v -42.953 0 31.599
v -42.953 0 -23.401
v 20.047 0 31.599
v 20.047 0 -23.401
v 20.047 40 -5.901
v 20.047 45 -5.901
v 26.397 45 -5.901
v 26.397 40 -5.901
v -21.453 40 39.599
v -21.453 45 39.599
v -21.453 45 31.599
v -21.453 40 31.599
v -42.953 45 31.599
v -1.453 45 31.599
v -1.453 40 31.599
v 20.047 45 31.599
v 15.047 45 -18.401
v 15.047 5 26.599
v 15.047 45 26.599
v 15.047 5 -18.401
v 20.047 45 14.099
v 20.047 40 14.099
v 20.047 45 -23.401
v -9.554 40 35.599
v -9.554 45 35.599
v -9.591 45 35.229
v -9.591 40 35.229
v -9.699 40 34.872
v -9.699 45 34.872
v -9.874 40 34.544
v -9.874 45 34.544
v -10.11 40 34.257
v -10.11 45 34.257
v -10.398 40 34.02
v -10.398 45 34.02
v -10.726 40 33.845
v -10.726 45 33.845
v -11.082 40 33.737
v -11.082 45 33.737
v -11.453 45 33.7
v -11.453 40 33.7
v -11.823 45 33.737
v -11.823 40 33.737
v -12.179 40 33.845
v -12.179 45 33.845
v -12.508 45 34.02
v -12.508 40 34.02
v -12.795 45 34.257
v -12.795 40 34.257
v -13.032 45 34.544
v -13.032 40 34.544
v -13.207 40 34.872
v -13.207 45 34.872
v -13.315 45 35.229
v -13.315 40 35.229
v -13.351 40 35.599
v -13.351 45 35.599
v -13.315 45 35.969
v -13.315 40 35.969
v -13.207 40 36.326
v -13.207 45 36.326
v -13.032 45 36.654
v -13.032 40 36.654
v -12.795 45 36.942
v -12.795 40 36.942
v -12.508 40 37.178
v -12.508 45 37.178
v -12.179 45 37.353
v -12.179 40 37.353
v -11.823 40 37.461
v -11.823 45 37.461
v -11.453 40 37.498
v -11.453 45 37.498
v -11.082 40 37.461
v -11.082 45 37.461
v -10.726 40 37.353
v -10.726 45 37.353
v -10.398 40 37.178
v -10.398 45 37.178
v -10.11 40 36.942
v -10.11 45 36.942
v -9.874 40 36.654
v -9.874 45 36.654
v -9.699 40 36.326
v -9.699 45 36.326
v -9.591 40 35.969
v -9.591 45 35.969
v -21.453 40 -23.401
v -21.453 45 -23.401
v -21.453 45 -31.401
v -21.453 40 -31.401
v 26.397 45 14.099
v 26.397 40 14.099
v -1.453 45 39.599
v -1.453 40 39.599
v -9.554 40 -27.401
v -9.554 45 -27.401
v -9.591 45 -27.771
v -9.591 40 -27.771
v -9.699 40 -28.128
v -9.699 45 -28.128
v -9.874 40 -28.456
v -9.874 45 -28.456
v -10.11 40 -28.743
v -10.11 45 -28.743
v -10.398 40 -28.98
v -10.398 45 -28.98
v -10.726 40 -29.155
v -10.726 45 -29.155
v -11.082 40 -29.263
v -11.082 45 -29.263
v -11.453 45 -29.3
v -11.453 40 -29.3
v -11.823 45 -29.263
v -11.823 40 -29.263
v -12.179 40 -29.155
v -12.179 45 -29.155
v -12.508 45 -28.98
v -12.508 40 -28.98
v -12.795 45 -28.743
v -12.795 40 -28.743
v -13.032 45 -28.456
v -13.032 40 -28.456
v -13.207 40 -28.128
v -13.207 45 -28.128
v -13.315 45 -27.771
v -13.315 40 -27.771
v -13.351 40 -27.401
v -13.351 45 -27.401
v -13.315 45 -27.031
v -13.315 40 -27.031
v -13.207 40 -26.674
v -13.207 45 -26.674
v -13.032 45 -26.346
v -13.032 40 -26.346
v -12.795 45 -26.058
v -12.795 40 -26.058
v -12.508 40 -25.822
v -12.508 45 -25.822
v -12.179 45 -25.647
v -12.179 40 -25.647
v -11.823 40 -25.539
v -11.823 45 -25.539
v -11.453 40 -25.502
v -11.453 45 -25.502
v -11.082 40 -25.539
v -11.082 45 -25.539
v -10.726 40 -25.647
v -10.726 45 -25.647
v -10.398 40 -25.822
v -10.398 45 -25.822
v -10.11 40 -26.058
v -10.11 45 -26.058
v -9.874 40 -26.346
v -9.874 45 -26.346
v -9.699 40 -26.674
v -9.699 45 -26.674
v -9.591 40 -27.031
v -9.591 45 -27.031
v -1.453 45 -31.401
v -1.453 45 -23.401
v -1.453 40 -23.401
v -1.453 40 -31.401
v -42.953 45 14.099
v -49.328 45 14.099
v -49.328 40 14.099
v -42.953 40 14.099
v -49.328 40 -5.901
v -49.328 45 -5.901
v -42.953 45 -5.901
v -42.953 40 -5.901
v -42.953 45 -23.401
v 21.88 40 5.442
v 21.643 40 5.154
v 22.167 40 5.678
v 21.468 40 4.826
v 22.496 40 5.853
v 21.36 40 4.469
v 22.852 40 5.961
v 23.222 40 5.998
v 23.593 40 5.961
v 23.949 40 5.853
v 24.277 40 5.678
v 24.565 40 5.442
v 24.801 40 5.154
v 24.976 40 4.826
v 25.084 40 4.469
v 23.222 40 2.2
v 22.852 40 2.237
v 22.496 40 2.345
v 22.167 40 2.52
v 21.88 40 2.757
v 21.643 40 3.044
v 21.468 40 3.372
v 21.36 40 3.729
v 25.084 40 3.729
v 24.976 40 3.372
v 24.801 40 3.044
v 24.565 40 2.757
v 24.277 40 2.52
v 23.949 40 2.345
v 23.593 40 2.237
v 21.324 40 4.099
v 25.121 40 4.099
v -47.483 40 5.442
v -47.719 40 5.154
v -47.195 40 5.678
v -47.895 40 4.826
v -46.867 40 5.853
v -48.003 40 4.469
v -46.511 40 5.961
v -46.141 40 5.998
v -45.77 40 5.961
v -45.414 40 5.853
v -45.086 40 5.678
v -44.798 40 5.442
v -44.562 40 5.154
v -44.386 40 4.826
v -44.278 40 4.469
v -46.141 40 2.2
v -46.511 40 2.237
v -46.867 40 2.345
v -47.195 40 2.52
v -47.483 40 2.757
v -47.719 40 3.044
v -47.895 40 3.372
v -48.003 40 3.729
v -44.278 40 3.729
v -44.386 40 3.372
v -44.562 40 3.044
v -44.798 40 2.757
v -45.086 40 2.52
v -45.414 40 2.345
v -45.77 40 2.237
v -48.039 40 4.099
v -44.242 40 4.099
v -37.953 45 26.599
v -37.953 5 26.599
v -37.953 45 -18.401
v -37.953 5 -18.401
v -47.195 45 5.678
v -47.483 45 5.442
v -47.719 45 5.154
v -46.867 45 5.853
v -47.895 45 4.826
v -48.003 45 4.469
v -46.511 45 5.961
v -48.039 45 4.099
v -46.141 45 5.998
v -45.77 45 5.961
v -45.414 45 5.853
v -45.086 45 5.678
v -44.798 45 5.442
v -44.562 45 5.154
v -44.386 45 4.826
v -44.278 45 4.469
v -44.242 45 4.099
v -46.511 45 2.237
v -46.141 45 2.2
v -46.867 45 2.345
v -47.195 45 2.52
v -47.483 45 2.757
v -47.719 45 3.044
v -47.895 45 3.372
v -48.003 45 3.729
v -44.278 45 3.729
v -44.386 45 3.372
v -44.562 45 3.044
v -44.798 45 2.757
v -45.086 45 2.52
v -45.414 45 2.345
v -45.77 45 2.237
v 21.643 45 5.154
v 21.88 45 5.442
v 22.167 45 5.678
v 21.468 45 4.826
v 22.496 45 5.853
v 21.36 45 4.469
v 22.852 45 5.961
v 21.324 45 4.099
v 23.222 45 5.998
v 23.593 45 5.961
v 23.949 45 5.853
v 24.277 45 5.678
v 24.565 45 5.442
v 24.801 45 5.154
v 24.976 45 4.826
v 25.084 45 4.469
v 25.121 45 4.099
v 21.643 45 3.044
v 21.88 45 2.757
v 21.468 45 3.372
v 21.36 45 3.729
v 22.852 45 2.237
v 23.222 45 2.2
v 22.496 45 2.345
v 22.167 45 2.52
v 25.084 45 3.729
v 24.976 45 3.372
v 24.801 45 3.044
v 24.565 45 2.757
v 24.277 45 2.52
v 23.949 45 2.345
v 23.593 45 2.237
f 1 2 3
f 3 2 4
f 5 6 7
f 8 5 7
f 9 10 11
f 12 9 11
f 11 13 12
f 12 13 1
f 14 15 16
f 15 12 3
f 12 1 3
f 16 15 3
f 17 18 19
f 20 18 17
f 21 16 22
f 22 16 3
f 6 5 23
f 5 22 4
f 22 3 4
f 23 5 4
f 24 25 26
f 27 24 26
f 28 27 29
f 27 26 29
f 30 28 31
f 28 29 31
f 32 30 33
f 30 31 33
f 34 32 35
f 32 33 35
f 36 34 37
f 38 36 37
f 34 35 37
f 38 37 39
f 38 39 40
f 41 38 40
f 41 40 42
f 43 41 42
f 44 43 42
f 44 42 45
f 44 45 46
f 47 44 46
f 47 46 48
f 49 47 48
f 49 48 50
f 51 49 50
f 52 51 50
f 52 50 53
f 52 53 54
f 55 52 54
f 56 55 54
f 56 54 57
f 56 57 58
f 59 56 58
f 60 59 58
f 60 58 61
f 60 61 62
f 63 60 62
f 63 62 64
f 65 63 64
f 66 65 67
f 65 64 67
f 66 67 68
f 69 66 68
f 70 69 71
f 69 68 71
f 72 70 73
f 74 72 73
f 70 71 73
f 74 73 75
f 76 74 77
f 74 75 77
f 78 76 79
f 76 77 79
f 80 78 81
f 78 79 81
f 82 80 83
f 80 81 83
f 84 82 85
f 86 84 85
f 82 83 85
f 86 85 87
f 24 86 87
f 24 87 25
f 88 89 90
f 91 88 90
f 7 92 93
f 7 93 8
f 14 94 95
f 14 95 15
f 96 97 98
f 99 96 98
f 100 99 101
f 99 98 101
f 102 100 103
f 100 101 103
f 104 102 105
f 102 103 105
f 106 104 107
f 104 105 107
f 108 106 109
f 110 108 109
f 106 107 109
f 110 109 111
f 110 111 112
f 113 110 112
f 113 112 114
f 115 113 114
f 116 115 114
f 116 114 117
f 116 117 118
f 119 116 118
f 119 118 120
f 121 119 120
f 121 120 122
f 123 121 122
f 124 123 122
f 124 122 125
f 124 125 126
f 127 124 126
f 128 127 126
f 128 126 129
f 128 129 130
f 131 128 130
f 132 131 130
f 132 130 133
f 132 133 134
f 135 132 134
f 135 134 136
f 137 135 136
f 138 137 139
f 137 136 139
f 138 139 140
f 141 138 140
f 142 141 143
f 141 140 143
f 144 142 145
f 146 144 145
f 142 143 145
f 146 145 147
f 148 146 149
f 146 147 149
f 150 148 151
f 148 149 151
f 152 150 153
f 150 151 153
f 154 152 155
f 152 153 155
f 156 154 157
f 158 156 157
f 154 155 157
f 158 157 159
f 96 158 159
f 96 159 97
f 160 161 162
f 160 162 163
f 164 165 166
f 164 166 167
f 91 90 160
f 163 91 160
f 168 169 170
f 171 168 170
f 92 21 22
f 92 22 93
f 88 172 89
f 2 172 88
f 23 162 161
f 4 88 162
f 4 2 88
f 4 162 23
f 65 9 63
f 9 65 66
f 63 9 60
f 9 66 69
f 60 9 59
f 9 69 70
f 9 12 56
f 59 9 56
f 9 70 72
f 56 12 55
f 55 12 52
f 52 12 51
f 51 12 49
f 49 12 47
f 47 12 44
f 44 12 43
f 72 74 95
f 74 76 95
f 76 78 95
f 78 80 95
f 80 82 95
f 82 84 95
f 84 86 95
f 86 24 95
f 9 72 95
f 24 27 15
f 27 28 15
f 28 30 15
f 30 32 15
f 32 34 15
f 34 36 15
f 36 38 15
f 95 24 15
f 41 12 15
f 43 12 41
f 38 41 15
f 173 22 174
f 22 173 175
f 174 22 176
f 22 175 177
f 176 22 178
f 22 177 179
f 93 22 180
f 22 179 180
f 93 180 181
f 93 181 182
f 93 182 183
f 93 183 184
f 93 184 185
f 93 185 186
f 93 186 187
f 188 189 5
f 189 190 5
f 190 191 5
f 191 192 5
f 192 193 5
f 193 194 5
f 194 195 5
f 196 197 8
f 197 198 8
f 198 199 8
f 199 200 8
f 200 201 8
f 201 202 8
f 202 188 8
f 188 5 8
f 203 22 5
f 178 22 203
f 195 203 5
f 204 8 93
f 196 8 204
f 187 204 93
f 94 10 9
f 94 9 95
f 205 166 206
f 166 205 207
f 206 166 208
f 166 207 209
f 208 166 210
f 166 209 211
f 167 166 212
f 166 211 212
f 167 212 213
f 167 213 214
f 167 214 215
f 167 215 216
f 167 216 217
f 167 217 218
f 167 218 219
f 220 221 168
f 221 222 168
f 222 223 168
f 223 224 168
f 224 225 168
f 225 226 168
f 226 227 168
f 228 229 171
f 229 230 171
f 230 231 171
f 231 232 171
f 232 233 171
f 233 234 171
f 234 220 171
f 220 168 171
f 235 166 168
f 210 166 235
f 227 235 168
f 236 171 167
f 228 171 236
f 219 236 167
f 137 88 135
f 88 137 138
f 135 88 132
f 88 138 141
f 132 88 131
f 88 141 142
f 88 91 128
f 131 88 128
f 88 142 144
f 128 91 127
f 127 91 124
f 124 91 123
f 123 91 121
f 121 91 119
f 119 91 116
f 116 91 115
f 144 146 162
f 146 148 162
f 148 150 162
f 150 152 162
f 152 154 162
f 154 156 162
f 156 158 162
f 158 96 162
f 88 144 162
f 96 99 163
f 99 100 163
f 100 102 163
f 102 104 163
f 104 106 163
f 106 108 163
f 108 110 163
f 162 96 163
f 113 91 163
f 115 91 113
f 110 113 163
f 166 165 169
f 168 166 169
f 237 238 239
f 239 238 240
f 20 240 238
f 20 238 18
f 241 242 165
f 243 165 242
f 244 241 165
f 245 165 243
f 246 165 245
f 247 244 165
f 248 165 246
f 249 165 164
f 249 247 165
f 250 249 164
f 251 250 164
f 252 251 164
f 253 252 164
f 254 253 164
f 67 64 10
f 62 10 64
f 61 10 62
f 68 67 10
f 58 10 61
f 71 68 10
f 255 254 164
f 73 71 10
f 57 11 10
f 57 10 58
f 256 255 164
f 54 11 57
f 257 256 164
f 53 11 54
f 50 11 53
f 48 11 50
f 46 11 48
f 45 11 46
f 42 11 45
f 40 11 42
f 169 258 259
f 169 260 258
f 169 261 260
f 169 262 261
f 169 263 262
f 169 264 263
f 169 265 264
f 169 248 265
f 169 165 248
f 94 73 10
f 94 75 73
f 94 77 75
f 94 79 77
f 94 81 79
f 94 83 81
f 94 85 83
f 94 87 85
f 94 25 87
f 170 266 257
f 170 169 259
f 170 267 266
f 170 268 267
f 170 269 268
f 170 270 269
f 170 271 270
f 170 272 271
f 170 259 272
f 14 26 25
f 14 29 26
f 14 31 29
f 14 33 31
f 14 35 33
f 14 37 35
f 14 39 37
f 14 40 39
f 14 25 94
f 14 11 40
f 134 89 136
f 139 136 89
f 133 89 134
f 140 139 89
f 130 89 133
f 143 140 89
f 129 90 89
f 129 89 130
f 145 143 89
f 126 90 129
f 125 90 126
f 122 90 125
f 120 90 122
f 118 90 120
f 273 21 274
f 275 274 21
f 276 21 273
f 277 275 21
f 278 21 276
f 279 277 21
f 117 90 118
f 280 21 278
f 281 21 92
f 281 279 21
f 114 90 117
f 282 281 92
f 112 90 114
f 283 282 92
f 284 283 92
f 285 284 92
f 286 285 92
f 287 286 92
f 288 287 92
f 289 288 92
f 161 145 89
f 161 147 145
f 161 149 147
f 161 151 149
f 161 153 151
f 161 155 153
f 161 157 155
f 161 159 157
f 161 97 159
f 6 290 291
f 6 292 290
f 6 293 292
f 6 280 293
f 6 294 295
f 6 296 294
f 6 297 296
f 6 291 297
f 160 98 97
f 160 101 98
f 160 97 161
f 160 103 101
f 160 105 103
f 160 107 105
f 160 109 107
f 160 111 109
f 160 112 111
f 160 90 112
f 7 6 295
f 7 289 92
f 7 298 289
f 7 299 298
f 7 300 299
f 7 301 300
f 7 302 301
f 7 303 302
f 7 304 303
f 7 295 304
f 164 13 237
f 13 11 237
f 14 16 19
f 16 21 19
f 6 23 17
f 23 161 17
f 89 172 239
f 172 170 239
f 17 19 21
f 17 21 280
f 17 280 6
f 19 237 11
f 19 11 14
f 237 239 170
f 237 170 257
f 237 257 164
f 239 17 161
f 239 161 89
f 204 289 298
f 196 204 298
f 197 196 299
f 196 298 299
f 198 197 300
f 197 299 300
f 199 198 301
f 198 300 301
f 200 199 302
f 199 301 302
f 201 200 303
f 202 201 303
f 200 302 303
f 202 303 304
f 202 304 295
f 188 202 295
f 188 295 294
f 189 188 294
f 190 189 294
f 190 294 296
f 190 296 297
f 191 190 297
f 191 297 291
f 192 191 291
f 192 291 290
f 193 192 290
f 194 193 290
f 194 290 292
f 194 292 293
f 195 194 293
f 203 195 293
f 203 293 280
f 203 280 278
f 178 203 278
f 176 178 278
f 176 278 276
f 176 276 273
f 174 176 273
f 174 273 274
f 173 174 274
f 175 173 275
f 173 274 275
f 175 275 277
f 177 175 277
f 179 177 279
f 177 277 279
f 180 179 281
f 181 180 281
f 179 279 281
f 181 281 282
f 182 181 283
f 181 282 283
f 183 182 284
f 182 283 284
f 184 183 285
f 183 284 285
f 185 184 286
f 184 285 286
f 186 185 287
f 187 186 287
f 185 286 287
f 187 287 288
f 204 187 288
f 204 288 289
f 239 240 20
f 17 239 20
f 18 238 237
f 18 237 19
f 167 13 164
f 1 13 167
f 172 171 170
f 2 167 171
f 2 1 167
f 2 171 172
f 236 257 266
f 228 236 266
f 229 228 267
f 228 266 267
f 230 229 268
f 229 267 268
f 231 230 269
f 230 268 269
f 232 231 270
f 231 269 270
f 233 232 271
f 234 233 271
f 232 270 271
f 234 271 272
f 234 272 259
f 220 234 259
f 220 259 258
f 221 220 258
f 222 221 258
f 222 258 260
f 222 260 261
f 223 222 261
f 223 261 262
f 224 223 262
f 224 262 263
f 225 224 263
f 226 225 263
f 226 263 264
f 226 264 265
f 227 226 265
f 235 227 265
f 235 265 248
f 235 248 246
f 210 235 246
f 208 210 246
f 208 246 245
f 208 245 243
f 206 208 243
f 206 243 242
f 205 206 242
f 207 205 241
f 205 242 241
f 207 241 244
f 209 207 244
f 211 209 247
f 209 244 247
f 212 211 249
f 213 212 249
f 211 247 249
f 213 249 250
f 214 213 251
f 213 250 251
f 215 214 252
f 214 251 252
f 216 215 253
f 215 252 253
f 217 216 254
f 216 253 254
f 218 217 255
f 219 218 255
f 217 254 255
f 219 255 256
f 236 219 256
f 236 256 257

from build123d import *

# Parameters (mm, degrees)
SKETCH1_W             = 63
SKETCH1_H             = 55
BOSS_EXTRUDE1_DEPTH   = 45
SHELL1_T              = -5
SKETCH5_W             = 20
SKETCH5_H             = 8
SKETCH5_W_2           = 6.3754
SKETCH5_H_2           = 20
SKETCH5_W_3           = 6.35
BOSS_EXTRUDE3_DEPTH   = 5
F_6_CLEARANCE_HOLE1_D = 3.7973


with BuildPart() as part:
    # Sketch1 → Boss-Extrude1 (new body)
    with BuildSketch(Plane(origin=(0, 0, 0), x_dir=(1, 0, 0), z_dir=(0, 1, 0))):
        with Locations((-11.452841564, -4.099064972)):
            Rectangle(SKETCH1_W, SKETCH1_H)
    extrude(amount=BOSS_EXTRUDE1_DEPTH)

    # Shell1
    shell1_openings = [part.faces().sort_by_distance(p)[0] for p in [
        (-11.452841564, 45, 4.099064972),
    ]]
    offset(amount=SHELL1_T, openings=shell1_openings, kind=Kind.INTERSECTION)

    # Sketch5 → Boss-Extrude3 (add)
    with BuildSketch(Plane(origin=(0, 45, 0), x_dir=(1, 0, 0), z_dir=(0, 1, 0))):
        with Locations((-11.452841564, 27.400935028)):
            Rectangle(SKETCH5_W, SKETCH5_H)
        with Locations((-11.452841564, -35.599064972)):
            Rectangle(SKETCH5_W, SKETCH5_H)
        with Locations((-46.140541564, -4.099064972)):
            Rectangle(SKETCH5_W_2, SKETCH5_H_2)
        with Locations((23.222158436, -4.099064972)):
            Rectangle(SKETCH5_W_3, SKETCH5_H_2)
    extrude(amount=-BOSS_EXTRUDE3_DEPTH)

    # #6 Clearance Hole1 (through all)
    with Locations(Plane(origin=(0, 40, 0), x_dir=(-1, 0, 0), z_dir=(0, -1, 0))):
        with Locations((11.452841564, -35.599064972), (11.452841564, 27.400935028), (46.140541564, -4.099064972), (-23.222158436, -4.099064972)):
            Hole(F_6_CLEARANCE_HOLE1_D / 2)


solid = part.part
